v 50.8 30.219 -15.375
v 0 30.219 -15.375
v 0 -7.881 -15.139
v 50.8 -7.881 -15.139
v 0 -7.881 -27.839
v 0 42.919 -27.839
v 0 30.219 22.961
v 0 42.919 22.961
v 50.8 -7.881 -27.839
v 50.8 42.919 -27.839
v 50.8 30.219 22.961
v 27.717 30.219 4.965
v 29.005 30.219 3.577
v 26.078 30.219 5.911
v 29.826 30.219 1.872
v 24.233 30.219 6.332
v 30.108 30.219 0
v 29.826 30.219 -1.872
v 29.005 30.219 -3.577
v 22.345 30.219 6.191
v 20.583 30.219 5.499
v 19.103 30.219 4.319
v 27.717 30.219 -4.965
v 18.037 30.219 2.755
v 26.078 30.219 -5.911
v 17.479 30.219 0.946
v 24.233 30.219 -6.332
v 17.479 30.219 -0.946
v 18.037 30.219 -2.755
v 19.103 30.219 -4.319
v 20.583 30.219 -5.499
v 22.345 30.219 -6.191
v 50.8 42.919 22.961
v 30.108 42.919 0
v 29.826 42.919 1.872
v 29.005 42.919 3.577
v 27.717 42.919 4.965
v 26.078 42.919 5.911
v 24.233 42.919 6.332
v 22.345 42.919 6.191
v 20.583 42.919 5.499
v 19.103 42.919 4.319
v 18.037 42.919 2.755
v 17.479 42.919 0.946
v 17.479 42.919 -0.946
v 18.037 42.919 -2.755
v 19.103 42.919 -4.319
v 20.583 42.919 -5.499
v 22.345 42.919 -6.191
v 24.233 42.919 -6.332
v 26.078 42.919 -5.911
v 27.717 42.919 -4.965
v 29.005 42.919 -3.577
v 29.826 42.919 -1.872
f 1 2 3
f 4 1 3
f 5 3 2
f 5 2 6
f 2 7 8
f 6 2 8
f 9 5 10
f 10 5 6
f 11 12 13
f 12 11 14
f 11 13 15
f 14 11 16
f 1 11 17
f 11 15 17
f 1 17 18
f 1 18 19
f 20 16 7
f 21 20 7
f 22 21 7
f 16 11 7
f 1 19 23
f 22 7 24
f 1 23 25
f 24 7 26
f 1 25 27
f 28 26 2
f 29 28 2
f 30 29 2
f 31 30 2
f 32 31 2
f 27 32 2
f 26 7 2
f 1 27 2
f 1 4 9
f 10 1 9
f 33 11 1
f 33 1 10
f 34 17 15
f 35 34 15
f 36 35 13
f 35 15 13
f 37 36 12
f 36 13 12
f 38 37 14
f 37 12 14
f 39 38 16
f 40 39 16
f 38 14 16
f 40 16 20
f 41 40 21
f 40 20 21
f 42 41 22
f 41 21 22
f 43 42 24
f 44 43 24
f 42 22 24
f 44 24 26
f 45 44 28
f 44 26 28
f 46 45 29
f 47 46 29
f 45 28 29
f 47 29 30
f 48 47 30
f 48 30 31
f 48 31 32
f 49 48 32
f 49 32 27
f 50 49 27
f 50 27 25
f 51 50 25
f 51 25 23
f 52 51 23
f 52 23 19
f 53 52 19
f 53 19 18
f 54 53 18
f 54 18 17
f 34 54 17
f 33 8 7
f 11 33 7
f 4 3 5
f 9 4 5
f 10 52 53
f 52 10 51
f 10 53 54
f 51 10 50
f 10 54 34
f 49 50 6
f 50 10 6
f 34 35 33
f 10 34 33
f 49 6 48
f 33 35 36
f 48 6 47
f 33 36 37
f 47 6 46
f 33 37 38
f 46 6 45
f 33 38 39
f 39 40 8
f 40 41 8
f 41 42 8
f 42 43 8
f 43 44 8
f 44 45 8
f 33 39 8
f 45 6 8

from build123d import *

# Parameters (mm, degrees)
F1_DEPTH = 50.8
F2_R     = 6.35
F3_DEPTH = 25.4


with BuildPart() as f1:
    # F0 (on Right) → F1 (new body)
    with BuildSketch(Plane.YZ):
        Polygon((42.91913, -27.839016), (42.91913, 22.960984), (30.21913, 22.960984), (30.21913, -15.374913), (-7.88087, -15.139016), (-7.88087, -27.839016), align=None)
    extrude(amount=F1_DEPTH)

    # F2 (on face) → F3 (cut)
    with BuildSketch(Plane.XZ.offset(-30.21913)):
        with Locations((23.75817, 0)):
            Circle(F2_R)
    extrude(amount=-F3_DEPTH, mode=Mode.SUBTRACT)


solid = f1.part
